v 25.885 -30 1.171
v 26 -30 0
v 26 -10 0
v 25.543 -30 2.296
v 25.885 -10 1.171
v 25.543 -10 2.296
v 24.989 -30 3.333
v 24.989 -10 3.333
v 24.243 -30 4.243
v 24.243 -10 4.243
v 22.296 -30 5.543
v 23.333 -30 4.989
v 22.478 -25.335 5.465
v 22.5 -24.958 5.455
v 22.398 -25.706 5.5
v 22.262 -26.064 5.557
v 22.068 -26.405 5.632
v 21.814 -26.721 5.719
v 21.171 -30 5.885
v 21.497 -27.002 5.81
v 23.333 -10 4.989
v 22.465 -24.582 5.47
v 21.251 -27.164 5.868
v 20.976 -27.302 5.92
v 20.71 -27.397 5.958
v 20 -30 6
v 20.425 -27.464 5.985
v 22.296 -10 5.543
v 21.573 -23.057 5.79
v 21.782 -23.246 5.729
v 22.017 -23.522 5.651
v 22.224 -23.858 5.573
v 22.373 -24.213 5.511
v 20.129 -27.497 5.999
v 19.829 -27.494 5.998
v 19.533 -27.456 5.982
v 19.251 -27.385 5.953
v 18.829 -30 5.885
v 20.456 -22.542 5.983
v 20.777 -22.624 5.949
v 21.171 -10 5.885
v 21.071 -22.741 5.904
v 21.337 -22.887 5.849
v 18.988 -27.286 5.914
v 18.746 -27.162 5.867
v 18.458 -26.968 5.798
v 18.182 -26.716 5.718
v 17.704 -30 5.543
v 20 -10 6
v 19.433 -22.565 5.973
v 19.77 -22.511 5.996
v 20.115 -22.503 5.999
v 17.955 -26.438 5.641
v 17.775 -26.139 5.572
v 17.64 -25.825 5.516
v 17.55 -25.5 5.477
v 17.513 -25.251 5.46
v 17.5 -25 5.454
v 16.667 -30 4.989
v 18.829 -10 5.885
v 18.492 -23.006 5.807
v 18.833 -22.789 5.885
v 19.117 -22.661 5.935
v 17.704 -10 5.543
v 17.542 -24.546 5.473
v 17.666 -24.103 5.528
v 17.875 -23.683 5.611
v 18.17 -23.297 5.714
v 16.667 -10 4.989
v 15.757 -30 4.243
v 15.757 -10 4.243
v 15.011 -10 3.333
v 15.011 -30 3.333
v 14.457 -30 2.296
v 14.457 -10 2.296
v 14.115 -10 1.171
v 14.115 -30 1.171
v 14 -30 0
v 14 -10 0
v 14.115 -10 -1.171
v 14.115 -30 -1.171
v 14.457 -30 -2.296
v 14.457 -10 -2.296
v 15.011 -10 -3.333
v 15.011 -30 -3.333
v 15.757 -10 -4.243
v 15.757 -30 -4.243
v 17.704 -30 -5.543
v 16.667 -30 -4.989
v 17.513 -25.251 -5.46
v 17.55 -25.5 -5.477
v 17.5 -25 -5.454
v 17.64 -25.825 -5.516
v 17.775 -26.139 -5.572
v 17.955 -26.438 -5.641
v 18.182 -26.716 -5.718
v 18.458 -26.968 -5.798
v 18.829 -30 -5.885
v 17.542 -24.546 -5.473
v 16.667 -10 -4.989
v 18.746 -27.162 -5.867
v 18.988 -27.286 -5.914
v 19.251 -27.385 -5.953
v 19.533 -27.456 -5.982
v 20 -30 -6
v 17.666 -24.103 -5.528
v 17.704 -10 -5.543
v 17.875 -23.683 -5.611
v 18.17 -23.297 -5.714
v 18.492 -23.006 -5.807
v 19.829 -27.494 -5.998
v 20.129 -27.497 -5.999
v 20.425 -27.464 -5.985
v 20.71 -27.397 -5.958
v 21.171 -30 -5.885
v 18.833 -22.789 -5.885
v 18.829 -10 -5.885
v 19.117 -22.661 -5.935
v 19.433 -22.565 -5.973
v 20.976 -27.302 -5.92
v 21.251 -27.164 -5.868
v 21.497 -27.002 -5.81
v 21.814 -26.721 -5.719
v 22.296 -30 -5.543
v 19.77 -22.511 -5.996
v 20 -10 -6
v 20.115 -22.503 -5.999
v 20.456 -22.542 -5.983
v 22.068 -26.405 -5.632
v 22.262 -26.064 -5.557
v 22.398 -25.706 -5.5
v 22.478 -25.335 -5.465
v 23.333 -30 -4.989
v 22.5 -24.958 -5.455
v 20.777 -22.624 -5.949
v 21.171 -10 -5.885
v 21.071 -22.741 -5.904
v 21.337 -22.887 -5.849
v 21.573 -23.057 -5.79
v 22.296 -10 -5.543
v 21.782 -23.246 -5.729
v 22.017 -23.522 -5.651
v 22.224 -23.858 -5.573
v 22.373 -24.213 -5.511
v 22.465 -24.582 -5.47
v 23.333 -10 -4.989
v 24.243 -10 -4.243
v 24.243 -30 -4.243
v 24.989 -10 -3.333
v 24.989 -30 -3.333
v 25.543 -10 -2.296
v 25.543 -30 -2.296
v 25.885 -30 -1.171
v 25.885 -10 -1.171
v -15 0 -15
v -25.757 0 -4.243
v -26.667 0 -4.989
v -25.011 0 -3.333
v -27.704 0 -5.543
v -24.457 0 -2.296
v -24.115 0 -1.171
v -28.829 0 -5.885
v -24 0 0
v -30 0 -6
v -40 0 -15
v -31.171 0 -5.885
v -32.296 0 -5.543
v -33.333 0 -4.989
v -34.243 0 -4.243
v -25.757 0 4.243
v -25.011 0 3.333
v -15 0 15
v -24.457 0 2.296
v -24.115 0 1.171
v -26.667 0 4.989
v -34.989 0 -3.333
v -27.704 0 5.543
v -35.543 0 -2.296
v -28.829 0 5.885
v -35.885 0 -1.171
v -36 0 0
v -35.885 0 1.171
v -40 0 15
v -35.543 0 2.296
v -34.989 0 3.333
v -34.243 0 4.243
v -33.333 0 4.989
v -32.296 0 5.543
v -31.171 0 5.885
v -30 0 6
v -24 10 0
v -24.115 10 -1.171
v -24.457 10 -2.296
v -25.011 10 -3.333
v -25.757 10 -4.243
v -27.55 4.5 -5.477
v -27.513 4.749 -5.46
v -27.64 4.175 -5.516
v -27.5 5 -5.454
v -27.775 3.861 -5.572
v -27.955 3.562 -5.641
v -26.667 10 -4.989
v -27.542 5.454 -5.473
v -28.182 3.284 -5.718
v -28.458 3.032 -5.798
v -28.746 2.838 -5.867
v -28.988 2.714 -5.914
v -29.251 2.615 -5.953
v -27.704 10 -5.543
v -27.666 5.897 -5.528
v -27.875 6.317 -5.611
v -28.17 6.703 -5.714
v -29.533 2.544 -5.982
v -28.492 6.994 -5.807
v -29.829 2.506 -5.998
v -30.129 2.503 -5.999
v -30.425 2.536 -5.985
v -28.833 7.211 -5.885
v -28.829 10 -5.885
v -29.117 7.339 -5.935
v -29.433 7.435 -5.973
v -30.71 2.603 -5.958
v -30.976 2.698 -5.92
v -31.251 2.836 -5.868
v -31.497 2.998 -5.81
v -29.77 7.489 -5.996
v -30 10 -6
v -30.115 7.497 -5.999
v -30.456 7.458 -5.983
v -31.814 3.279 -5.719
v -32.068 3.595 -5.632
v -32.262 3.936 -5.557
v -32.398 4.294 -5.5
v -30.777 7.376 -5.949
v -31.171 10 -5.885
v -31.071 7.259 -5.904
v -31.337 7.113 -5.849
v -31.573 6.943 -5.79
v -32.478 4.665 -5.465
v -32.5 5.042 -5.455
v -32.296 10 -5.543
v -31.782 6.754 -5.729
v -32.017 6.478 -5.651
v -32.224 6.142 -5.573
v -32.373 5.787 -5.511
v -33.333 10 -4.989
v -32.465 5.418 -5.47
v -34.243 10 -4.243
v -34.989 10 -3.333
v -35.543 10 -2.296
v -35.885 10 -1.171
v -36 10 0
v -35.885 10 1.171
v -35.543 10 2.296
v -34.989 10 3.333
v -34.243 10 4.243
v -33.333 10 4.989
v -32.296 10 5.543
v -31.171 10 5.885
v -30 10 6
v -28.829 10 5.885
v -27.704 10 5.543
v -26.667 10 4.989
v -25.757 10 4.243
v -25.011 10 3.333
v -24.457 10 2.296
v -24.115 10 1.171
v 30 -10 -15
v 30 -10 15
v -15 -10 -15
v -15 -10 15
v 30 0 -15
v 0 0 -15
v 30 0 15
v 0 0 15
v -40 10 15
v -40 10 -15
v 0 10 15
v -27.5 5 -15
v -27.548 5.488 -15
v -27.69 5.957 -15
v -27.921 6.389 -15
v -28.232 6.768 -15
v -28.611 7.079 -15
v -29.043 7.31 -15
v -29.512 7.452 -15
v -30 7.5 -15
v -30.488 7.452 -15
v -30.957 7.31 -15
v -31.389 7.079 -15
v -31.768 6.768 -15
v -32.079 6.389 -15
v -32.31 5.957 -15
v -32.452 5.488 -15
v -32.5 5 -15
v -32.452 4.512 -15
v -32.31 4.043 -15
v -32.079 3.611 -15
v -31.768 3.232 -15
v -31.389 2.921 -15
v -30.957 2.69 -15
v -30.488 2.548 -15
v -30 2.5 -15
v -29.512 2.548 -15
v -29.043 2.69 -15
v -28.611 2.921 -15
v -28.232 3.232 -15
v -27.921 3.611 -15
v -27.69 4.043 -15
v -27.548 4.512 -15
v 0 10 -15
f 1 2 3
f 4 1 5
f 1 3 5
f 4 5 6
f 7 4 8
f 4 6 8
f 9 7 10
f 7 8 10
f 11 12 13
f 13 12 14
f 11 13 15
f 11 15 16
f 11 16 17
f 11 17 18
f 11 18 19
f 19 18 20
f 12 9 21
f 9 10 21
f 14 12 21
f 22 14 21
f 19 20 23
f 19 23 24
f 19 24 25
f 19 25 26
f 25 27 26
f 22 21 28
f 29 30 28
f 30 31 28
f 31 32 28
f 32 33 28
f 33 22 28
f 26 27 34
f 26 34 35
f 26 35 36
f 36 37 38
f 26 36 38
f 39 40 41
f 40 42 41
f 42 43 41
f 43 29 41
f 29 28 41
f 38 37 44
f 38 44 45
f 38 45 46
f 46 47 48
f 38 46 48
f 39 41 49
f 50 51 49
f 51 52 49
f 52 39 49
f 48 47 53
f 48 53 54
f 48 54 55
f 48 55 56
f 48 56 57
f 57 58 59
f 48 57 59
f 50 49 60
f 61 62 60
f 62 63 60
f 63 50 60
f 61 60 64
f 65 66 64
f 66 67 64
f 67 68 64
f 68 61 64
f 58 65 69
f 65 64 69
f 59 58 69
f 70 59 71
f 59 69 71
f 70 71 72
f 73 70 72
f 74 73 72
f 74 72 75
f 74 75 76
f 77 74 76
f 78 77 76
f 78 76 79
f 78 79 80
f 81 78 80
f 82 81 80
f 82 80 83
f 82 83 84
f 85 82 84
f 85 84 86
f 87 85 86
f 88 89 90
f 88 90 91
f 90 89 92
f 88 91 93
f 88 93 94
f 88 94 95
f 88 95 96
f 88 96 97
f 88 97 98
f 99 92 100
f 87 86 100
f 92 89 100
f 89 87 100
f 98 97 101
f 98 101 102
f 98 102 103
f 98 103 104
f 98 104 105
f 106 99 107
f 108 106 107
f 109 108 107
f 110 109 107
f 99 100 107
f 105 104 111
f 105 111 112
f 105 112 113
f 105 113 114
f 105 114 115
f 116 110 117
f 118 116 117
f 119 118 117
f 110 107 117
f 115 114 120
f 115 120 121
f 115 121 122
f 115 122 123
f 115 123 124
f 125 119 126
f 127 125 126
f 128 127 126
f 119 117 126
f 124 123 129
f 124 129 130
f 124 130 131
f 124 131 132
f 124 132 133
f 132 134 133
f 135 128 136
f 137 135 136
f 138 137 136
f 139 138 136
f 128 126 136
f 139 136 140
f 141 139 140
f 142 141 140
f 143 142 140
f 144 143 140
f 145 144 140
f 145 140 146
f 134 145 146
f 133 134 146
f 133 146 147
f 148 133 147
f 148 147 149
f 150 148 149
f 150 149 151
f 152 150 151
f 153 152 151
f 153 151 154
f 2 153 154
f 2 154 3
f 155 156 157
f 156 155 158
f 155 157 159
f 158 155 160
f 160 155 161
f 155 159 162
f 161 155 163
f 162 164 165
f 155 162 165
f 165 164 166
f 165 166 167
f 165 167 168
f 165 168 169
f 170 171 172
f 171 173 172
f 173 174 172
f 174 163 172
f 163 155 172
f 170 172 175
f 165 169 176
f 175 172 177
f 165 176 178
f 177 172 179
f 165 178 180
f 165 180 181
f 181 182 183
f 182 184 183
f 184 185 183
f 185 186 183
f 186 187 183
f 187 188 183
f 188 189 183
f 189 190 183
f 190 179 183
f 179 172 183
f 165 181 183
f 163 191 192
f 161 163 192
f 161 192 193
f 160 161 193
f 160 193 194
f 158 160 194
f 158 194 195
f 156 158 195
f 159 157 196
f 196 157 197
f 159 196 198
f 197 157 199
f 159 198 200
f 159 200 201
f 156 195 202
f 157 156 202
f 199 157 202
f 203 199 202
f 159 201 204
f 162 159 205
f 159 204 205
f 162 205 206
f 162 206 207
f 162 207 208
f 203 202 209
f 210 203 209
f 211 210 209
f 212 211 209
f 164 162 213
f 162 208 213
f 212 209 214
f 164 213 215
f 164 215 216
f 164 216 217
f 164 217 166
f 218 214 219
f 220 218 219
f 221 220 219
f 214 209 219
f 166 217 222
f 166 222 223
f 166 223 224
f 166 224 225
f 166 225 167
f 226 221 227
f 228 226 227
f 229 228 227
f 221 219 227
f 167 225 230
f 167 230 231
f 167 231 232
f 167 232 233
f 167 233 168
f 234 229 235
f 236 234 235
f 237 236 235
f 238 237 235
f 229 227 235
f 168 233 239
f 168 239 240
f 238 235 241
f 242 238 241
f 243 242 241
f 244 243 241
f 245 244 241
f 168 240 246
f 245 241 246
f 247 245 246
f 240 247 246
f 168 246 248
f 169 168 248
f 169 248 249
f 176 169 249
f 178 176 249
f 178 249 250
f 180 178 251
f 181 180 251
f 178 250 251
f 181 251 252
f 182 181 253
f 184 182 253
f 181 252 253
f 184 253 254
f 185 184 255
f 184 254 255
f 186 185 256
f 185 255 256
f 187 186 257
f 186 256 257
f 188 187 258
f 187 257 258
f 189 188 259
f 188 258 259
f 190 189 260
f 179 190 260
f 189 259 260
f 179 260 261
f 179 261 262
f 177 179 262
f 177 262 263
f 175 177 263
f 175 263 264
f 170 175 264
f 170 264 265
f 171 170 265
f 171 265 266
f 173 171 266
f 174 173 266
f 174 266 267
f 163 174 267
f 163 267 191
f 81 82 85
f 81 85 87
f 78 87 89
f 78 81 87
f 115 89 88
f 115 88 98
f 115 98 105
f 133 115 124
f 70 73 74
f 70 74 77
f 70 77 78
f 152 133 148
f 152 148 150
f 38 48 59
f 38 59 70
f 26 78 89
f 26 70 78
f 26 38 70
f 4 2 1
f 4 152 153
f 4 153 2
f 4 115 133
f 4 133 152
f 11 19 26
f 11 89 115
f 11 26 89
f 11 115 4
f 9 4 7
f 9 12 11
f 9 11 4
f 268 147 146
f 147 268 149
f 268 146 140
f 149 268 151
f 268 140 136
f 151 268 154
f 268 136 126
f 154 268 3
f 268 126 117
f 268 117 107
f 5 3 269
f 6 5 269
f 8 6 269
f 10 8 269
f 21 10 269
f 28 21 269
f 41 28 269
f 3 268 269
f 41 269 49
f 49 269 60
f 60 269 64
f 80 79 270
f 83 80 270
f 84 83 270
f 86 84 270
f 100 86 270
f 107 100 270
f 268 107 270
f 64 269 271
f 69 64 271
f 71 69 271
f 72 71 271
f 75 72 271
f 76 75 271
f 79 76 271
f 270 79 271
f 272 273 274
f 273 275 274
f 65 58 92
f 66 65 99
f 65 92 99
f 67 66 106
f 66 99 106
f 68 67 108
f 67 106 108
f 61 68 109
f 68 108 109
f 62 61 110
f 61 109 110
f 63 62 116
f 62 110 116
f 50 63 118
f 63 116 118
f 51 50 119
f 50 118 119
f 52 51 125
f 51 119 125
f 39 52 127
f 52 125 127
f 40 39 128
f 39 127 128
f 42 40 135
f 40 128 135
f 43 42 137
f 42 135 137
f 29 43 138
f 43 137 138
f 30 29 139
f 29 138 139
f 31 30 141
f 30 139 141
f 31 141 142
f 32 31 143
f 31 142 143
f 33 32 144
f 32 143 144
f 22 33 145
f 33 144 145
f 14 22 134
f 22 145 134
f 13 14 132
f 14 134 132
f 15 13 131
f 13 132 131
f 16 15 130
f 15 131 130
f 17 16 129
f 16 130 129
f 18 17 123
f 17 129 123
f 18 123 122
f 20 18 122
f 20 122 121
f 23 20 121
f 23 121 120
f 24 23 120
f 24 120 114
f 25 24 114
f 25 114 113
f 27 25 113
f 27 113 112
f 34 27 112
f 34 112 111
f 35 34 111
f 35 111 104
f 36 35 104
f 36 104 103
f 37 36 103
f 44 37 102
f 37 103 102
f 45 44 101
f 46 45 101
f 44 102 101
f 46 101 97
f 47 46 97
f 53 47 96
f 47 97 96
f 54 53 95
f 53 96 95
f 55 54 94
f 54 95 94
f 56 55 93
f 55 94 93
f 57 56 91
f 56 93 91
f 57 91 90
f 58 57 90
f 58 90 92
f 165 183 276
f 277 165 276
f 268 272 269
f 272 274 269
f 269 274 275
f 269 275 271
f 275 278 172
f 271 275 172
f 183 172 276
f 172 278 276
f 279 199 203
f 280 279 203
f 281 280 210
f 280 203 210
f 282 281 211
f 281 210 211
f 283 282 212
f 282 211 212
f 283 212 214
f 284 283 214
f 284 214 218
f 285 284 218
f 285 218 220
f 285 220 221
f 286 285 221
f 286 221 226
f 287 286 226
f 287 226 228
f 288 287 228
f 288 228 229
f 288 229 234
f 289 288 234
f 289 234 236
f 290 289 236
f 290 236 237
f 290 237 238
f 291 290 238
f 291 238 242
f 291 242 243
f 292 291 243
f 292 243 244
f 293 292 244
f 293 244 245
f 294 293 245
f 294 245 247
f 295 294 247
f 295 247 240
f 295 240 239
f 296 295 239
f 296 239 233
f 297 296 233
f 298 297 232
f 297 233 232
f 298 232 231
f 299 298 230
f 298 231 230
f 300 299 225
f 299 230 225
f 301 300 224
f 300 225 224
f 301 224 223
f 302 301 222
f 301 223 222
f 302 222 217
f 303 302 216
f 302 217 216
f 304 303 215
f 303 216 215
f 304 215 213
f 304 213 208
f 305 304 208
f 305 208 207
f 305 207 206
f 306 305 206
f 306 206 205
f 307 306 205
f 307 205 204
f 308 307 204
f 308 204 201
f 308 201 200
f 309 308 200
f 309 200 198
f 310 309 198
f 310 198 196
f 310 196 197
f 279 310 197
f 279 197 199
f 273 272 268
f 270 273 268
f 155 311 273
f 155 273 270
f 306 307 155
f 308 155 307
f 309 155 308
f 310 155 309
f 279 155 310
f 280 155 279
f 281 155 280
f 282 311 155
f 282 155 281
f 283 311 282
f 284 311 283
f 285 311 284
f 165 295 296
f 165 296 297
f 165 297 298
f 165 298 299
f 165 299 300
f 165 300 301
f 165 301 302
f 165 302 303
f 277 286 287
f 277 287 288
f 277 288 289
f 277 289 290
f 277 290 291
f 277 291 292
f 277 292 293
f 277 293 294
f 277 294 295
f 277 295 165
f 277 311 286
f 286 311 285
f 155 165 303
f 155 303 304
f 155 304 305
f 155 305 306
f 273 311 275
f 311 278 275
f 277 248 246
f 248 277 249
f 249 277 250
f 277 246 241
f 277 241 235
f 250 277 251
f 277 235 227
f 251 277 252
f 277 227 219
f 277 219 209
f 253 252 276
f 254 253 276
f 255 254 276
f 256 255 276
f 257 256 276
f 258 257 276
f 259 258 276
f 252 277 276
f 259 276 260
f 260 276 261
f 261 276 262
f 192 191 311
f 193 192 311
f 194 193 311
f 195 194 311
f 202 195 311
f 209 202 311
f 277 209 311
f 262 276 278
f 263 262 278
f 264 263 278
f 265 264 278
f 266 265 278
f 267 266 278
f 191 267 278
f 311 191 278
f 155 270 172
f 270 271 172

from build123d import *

# Parameters (mm, degrees)
EXTRUDE_1_DEPTH          = 15
CUT_EXTRUDE_1_REACH      = 22
SKETCH_2_R               = 6
SKETCH_3_R               = 6
EXTRUDE_2_DEPTH          = 20
SKETCH_4_R               = 2.5
CUT_EXTRUDE_2_DEPTH      = 16
SKETCH_5_R               = 2.5
CUT_EXTRUDE_3_DEPTH      = 16.0000001
CUT_EXTRUDE_3_DEPTH_BACK = 16


with BuildPart() as part:
    # 草图1 → 凸台-拉伸1 (new body, symmetric)
    with BuildSketch(Plane.XY):
        Polygon((-40, 10), (0, 10), (0, 0), (30, 0), (30, -10), (-15, -10), (-15, 0), (-40, 0), align=None)
    extrude(amount=EXTRUDE_1_DEPTH, both=True)

    # 草图2 → 切除-拉伸1 (cut, up to next)
    with BuildSketch(Plane(origin=(0, 10, 0), x_dir=(1, 0, 0), z_dir=(0, 1, 0)), mode=Mode.PRIVATE) as cut_extrude_1_sk1:
        with Locations((-30, 0)):
            Circle(SKETCH_2_R)
    cut_extrude_1_tool1 = extrude(cut_extrude_1_sk1.sketch, amount=-CUT_EXTRUDE_1_REACH, mode=Mode.PRIVATE) & part.part
    add(cut_extrude_1_tool1.solids().sort_by_distance((-30, 10, 0))[0], mode=Mode.SUBTRACT)

    # 草图3 → 凸台-拉伸2 (add)
    with BuildSketch(Plane.XZ.offset(10)):
        with Locations((20, 0)):
            Circle(SKETCH_3_R)
    extrude(amount=EXTRUDE_2_DEPTH)

    # 草图4 → 切除-拉伸2 (cut, through all)
    with BuildSketch(Plane.XY):
        with Locations((-30, 5)):
            Circle(SKETCH_4_R)
    extrude(amount=-CUT_EXTRUDE_2_DEPTH, mode=Mode.SUBTRACT)

    # 草图5 → 切除-拉伸3 (cut, two sides)
    with BuildSketch(Plane(origin=(0, 0, 0), x_dir=(-1, 0, 0), z_dir=(0, 0, -1))) as cut_extrude_3_sk:
        with Locations((-20, -25)):
            Circle(SKETCH_5_R)
    extrude(amount=CUT_EXTRUDE_3_DEPTH, mode=Mode.SUBTRACT)
    extrude(cut_extrude_3_sk.sketch, amount=-CUT_EXTRUDE_3_DEPTH_BACK, mode=Mode.SUBTRACT)


solid = part.part
